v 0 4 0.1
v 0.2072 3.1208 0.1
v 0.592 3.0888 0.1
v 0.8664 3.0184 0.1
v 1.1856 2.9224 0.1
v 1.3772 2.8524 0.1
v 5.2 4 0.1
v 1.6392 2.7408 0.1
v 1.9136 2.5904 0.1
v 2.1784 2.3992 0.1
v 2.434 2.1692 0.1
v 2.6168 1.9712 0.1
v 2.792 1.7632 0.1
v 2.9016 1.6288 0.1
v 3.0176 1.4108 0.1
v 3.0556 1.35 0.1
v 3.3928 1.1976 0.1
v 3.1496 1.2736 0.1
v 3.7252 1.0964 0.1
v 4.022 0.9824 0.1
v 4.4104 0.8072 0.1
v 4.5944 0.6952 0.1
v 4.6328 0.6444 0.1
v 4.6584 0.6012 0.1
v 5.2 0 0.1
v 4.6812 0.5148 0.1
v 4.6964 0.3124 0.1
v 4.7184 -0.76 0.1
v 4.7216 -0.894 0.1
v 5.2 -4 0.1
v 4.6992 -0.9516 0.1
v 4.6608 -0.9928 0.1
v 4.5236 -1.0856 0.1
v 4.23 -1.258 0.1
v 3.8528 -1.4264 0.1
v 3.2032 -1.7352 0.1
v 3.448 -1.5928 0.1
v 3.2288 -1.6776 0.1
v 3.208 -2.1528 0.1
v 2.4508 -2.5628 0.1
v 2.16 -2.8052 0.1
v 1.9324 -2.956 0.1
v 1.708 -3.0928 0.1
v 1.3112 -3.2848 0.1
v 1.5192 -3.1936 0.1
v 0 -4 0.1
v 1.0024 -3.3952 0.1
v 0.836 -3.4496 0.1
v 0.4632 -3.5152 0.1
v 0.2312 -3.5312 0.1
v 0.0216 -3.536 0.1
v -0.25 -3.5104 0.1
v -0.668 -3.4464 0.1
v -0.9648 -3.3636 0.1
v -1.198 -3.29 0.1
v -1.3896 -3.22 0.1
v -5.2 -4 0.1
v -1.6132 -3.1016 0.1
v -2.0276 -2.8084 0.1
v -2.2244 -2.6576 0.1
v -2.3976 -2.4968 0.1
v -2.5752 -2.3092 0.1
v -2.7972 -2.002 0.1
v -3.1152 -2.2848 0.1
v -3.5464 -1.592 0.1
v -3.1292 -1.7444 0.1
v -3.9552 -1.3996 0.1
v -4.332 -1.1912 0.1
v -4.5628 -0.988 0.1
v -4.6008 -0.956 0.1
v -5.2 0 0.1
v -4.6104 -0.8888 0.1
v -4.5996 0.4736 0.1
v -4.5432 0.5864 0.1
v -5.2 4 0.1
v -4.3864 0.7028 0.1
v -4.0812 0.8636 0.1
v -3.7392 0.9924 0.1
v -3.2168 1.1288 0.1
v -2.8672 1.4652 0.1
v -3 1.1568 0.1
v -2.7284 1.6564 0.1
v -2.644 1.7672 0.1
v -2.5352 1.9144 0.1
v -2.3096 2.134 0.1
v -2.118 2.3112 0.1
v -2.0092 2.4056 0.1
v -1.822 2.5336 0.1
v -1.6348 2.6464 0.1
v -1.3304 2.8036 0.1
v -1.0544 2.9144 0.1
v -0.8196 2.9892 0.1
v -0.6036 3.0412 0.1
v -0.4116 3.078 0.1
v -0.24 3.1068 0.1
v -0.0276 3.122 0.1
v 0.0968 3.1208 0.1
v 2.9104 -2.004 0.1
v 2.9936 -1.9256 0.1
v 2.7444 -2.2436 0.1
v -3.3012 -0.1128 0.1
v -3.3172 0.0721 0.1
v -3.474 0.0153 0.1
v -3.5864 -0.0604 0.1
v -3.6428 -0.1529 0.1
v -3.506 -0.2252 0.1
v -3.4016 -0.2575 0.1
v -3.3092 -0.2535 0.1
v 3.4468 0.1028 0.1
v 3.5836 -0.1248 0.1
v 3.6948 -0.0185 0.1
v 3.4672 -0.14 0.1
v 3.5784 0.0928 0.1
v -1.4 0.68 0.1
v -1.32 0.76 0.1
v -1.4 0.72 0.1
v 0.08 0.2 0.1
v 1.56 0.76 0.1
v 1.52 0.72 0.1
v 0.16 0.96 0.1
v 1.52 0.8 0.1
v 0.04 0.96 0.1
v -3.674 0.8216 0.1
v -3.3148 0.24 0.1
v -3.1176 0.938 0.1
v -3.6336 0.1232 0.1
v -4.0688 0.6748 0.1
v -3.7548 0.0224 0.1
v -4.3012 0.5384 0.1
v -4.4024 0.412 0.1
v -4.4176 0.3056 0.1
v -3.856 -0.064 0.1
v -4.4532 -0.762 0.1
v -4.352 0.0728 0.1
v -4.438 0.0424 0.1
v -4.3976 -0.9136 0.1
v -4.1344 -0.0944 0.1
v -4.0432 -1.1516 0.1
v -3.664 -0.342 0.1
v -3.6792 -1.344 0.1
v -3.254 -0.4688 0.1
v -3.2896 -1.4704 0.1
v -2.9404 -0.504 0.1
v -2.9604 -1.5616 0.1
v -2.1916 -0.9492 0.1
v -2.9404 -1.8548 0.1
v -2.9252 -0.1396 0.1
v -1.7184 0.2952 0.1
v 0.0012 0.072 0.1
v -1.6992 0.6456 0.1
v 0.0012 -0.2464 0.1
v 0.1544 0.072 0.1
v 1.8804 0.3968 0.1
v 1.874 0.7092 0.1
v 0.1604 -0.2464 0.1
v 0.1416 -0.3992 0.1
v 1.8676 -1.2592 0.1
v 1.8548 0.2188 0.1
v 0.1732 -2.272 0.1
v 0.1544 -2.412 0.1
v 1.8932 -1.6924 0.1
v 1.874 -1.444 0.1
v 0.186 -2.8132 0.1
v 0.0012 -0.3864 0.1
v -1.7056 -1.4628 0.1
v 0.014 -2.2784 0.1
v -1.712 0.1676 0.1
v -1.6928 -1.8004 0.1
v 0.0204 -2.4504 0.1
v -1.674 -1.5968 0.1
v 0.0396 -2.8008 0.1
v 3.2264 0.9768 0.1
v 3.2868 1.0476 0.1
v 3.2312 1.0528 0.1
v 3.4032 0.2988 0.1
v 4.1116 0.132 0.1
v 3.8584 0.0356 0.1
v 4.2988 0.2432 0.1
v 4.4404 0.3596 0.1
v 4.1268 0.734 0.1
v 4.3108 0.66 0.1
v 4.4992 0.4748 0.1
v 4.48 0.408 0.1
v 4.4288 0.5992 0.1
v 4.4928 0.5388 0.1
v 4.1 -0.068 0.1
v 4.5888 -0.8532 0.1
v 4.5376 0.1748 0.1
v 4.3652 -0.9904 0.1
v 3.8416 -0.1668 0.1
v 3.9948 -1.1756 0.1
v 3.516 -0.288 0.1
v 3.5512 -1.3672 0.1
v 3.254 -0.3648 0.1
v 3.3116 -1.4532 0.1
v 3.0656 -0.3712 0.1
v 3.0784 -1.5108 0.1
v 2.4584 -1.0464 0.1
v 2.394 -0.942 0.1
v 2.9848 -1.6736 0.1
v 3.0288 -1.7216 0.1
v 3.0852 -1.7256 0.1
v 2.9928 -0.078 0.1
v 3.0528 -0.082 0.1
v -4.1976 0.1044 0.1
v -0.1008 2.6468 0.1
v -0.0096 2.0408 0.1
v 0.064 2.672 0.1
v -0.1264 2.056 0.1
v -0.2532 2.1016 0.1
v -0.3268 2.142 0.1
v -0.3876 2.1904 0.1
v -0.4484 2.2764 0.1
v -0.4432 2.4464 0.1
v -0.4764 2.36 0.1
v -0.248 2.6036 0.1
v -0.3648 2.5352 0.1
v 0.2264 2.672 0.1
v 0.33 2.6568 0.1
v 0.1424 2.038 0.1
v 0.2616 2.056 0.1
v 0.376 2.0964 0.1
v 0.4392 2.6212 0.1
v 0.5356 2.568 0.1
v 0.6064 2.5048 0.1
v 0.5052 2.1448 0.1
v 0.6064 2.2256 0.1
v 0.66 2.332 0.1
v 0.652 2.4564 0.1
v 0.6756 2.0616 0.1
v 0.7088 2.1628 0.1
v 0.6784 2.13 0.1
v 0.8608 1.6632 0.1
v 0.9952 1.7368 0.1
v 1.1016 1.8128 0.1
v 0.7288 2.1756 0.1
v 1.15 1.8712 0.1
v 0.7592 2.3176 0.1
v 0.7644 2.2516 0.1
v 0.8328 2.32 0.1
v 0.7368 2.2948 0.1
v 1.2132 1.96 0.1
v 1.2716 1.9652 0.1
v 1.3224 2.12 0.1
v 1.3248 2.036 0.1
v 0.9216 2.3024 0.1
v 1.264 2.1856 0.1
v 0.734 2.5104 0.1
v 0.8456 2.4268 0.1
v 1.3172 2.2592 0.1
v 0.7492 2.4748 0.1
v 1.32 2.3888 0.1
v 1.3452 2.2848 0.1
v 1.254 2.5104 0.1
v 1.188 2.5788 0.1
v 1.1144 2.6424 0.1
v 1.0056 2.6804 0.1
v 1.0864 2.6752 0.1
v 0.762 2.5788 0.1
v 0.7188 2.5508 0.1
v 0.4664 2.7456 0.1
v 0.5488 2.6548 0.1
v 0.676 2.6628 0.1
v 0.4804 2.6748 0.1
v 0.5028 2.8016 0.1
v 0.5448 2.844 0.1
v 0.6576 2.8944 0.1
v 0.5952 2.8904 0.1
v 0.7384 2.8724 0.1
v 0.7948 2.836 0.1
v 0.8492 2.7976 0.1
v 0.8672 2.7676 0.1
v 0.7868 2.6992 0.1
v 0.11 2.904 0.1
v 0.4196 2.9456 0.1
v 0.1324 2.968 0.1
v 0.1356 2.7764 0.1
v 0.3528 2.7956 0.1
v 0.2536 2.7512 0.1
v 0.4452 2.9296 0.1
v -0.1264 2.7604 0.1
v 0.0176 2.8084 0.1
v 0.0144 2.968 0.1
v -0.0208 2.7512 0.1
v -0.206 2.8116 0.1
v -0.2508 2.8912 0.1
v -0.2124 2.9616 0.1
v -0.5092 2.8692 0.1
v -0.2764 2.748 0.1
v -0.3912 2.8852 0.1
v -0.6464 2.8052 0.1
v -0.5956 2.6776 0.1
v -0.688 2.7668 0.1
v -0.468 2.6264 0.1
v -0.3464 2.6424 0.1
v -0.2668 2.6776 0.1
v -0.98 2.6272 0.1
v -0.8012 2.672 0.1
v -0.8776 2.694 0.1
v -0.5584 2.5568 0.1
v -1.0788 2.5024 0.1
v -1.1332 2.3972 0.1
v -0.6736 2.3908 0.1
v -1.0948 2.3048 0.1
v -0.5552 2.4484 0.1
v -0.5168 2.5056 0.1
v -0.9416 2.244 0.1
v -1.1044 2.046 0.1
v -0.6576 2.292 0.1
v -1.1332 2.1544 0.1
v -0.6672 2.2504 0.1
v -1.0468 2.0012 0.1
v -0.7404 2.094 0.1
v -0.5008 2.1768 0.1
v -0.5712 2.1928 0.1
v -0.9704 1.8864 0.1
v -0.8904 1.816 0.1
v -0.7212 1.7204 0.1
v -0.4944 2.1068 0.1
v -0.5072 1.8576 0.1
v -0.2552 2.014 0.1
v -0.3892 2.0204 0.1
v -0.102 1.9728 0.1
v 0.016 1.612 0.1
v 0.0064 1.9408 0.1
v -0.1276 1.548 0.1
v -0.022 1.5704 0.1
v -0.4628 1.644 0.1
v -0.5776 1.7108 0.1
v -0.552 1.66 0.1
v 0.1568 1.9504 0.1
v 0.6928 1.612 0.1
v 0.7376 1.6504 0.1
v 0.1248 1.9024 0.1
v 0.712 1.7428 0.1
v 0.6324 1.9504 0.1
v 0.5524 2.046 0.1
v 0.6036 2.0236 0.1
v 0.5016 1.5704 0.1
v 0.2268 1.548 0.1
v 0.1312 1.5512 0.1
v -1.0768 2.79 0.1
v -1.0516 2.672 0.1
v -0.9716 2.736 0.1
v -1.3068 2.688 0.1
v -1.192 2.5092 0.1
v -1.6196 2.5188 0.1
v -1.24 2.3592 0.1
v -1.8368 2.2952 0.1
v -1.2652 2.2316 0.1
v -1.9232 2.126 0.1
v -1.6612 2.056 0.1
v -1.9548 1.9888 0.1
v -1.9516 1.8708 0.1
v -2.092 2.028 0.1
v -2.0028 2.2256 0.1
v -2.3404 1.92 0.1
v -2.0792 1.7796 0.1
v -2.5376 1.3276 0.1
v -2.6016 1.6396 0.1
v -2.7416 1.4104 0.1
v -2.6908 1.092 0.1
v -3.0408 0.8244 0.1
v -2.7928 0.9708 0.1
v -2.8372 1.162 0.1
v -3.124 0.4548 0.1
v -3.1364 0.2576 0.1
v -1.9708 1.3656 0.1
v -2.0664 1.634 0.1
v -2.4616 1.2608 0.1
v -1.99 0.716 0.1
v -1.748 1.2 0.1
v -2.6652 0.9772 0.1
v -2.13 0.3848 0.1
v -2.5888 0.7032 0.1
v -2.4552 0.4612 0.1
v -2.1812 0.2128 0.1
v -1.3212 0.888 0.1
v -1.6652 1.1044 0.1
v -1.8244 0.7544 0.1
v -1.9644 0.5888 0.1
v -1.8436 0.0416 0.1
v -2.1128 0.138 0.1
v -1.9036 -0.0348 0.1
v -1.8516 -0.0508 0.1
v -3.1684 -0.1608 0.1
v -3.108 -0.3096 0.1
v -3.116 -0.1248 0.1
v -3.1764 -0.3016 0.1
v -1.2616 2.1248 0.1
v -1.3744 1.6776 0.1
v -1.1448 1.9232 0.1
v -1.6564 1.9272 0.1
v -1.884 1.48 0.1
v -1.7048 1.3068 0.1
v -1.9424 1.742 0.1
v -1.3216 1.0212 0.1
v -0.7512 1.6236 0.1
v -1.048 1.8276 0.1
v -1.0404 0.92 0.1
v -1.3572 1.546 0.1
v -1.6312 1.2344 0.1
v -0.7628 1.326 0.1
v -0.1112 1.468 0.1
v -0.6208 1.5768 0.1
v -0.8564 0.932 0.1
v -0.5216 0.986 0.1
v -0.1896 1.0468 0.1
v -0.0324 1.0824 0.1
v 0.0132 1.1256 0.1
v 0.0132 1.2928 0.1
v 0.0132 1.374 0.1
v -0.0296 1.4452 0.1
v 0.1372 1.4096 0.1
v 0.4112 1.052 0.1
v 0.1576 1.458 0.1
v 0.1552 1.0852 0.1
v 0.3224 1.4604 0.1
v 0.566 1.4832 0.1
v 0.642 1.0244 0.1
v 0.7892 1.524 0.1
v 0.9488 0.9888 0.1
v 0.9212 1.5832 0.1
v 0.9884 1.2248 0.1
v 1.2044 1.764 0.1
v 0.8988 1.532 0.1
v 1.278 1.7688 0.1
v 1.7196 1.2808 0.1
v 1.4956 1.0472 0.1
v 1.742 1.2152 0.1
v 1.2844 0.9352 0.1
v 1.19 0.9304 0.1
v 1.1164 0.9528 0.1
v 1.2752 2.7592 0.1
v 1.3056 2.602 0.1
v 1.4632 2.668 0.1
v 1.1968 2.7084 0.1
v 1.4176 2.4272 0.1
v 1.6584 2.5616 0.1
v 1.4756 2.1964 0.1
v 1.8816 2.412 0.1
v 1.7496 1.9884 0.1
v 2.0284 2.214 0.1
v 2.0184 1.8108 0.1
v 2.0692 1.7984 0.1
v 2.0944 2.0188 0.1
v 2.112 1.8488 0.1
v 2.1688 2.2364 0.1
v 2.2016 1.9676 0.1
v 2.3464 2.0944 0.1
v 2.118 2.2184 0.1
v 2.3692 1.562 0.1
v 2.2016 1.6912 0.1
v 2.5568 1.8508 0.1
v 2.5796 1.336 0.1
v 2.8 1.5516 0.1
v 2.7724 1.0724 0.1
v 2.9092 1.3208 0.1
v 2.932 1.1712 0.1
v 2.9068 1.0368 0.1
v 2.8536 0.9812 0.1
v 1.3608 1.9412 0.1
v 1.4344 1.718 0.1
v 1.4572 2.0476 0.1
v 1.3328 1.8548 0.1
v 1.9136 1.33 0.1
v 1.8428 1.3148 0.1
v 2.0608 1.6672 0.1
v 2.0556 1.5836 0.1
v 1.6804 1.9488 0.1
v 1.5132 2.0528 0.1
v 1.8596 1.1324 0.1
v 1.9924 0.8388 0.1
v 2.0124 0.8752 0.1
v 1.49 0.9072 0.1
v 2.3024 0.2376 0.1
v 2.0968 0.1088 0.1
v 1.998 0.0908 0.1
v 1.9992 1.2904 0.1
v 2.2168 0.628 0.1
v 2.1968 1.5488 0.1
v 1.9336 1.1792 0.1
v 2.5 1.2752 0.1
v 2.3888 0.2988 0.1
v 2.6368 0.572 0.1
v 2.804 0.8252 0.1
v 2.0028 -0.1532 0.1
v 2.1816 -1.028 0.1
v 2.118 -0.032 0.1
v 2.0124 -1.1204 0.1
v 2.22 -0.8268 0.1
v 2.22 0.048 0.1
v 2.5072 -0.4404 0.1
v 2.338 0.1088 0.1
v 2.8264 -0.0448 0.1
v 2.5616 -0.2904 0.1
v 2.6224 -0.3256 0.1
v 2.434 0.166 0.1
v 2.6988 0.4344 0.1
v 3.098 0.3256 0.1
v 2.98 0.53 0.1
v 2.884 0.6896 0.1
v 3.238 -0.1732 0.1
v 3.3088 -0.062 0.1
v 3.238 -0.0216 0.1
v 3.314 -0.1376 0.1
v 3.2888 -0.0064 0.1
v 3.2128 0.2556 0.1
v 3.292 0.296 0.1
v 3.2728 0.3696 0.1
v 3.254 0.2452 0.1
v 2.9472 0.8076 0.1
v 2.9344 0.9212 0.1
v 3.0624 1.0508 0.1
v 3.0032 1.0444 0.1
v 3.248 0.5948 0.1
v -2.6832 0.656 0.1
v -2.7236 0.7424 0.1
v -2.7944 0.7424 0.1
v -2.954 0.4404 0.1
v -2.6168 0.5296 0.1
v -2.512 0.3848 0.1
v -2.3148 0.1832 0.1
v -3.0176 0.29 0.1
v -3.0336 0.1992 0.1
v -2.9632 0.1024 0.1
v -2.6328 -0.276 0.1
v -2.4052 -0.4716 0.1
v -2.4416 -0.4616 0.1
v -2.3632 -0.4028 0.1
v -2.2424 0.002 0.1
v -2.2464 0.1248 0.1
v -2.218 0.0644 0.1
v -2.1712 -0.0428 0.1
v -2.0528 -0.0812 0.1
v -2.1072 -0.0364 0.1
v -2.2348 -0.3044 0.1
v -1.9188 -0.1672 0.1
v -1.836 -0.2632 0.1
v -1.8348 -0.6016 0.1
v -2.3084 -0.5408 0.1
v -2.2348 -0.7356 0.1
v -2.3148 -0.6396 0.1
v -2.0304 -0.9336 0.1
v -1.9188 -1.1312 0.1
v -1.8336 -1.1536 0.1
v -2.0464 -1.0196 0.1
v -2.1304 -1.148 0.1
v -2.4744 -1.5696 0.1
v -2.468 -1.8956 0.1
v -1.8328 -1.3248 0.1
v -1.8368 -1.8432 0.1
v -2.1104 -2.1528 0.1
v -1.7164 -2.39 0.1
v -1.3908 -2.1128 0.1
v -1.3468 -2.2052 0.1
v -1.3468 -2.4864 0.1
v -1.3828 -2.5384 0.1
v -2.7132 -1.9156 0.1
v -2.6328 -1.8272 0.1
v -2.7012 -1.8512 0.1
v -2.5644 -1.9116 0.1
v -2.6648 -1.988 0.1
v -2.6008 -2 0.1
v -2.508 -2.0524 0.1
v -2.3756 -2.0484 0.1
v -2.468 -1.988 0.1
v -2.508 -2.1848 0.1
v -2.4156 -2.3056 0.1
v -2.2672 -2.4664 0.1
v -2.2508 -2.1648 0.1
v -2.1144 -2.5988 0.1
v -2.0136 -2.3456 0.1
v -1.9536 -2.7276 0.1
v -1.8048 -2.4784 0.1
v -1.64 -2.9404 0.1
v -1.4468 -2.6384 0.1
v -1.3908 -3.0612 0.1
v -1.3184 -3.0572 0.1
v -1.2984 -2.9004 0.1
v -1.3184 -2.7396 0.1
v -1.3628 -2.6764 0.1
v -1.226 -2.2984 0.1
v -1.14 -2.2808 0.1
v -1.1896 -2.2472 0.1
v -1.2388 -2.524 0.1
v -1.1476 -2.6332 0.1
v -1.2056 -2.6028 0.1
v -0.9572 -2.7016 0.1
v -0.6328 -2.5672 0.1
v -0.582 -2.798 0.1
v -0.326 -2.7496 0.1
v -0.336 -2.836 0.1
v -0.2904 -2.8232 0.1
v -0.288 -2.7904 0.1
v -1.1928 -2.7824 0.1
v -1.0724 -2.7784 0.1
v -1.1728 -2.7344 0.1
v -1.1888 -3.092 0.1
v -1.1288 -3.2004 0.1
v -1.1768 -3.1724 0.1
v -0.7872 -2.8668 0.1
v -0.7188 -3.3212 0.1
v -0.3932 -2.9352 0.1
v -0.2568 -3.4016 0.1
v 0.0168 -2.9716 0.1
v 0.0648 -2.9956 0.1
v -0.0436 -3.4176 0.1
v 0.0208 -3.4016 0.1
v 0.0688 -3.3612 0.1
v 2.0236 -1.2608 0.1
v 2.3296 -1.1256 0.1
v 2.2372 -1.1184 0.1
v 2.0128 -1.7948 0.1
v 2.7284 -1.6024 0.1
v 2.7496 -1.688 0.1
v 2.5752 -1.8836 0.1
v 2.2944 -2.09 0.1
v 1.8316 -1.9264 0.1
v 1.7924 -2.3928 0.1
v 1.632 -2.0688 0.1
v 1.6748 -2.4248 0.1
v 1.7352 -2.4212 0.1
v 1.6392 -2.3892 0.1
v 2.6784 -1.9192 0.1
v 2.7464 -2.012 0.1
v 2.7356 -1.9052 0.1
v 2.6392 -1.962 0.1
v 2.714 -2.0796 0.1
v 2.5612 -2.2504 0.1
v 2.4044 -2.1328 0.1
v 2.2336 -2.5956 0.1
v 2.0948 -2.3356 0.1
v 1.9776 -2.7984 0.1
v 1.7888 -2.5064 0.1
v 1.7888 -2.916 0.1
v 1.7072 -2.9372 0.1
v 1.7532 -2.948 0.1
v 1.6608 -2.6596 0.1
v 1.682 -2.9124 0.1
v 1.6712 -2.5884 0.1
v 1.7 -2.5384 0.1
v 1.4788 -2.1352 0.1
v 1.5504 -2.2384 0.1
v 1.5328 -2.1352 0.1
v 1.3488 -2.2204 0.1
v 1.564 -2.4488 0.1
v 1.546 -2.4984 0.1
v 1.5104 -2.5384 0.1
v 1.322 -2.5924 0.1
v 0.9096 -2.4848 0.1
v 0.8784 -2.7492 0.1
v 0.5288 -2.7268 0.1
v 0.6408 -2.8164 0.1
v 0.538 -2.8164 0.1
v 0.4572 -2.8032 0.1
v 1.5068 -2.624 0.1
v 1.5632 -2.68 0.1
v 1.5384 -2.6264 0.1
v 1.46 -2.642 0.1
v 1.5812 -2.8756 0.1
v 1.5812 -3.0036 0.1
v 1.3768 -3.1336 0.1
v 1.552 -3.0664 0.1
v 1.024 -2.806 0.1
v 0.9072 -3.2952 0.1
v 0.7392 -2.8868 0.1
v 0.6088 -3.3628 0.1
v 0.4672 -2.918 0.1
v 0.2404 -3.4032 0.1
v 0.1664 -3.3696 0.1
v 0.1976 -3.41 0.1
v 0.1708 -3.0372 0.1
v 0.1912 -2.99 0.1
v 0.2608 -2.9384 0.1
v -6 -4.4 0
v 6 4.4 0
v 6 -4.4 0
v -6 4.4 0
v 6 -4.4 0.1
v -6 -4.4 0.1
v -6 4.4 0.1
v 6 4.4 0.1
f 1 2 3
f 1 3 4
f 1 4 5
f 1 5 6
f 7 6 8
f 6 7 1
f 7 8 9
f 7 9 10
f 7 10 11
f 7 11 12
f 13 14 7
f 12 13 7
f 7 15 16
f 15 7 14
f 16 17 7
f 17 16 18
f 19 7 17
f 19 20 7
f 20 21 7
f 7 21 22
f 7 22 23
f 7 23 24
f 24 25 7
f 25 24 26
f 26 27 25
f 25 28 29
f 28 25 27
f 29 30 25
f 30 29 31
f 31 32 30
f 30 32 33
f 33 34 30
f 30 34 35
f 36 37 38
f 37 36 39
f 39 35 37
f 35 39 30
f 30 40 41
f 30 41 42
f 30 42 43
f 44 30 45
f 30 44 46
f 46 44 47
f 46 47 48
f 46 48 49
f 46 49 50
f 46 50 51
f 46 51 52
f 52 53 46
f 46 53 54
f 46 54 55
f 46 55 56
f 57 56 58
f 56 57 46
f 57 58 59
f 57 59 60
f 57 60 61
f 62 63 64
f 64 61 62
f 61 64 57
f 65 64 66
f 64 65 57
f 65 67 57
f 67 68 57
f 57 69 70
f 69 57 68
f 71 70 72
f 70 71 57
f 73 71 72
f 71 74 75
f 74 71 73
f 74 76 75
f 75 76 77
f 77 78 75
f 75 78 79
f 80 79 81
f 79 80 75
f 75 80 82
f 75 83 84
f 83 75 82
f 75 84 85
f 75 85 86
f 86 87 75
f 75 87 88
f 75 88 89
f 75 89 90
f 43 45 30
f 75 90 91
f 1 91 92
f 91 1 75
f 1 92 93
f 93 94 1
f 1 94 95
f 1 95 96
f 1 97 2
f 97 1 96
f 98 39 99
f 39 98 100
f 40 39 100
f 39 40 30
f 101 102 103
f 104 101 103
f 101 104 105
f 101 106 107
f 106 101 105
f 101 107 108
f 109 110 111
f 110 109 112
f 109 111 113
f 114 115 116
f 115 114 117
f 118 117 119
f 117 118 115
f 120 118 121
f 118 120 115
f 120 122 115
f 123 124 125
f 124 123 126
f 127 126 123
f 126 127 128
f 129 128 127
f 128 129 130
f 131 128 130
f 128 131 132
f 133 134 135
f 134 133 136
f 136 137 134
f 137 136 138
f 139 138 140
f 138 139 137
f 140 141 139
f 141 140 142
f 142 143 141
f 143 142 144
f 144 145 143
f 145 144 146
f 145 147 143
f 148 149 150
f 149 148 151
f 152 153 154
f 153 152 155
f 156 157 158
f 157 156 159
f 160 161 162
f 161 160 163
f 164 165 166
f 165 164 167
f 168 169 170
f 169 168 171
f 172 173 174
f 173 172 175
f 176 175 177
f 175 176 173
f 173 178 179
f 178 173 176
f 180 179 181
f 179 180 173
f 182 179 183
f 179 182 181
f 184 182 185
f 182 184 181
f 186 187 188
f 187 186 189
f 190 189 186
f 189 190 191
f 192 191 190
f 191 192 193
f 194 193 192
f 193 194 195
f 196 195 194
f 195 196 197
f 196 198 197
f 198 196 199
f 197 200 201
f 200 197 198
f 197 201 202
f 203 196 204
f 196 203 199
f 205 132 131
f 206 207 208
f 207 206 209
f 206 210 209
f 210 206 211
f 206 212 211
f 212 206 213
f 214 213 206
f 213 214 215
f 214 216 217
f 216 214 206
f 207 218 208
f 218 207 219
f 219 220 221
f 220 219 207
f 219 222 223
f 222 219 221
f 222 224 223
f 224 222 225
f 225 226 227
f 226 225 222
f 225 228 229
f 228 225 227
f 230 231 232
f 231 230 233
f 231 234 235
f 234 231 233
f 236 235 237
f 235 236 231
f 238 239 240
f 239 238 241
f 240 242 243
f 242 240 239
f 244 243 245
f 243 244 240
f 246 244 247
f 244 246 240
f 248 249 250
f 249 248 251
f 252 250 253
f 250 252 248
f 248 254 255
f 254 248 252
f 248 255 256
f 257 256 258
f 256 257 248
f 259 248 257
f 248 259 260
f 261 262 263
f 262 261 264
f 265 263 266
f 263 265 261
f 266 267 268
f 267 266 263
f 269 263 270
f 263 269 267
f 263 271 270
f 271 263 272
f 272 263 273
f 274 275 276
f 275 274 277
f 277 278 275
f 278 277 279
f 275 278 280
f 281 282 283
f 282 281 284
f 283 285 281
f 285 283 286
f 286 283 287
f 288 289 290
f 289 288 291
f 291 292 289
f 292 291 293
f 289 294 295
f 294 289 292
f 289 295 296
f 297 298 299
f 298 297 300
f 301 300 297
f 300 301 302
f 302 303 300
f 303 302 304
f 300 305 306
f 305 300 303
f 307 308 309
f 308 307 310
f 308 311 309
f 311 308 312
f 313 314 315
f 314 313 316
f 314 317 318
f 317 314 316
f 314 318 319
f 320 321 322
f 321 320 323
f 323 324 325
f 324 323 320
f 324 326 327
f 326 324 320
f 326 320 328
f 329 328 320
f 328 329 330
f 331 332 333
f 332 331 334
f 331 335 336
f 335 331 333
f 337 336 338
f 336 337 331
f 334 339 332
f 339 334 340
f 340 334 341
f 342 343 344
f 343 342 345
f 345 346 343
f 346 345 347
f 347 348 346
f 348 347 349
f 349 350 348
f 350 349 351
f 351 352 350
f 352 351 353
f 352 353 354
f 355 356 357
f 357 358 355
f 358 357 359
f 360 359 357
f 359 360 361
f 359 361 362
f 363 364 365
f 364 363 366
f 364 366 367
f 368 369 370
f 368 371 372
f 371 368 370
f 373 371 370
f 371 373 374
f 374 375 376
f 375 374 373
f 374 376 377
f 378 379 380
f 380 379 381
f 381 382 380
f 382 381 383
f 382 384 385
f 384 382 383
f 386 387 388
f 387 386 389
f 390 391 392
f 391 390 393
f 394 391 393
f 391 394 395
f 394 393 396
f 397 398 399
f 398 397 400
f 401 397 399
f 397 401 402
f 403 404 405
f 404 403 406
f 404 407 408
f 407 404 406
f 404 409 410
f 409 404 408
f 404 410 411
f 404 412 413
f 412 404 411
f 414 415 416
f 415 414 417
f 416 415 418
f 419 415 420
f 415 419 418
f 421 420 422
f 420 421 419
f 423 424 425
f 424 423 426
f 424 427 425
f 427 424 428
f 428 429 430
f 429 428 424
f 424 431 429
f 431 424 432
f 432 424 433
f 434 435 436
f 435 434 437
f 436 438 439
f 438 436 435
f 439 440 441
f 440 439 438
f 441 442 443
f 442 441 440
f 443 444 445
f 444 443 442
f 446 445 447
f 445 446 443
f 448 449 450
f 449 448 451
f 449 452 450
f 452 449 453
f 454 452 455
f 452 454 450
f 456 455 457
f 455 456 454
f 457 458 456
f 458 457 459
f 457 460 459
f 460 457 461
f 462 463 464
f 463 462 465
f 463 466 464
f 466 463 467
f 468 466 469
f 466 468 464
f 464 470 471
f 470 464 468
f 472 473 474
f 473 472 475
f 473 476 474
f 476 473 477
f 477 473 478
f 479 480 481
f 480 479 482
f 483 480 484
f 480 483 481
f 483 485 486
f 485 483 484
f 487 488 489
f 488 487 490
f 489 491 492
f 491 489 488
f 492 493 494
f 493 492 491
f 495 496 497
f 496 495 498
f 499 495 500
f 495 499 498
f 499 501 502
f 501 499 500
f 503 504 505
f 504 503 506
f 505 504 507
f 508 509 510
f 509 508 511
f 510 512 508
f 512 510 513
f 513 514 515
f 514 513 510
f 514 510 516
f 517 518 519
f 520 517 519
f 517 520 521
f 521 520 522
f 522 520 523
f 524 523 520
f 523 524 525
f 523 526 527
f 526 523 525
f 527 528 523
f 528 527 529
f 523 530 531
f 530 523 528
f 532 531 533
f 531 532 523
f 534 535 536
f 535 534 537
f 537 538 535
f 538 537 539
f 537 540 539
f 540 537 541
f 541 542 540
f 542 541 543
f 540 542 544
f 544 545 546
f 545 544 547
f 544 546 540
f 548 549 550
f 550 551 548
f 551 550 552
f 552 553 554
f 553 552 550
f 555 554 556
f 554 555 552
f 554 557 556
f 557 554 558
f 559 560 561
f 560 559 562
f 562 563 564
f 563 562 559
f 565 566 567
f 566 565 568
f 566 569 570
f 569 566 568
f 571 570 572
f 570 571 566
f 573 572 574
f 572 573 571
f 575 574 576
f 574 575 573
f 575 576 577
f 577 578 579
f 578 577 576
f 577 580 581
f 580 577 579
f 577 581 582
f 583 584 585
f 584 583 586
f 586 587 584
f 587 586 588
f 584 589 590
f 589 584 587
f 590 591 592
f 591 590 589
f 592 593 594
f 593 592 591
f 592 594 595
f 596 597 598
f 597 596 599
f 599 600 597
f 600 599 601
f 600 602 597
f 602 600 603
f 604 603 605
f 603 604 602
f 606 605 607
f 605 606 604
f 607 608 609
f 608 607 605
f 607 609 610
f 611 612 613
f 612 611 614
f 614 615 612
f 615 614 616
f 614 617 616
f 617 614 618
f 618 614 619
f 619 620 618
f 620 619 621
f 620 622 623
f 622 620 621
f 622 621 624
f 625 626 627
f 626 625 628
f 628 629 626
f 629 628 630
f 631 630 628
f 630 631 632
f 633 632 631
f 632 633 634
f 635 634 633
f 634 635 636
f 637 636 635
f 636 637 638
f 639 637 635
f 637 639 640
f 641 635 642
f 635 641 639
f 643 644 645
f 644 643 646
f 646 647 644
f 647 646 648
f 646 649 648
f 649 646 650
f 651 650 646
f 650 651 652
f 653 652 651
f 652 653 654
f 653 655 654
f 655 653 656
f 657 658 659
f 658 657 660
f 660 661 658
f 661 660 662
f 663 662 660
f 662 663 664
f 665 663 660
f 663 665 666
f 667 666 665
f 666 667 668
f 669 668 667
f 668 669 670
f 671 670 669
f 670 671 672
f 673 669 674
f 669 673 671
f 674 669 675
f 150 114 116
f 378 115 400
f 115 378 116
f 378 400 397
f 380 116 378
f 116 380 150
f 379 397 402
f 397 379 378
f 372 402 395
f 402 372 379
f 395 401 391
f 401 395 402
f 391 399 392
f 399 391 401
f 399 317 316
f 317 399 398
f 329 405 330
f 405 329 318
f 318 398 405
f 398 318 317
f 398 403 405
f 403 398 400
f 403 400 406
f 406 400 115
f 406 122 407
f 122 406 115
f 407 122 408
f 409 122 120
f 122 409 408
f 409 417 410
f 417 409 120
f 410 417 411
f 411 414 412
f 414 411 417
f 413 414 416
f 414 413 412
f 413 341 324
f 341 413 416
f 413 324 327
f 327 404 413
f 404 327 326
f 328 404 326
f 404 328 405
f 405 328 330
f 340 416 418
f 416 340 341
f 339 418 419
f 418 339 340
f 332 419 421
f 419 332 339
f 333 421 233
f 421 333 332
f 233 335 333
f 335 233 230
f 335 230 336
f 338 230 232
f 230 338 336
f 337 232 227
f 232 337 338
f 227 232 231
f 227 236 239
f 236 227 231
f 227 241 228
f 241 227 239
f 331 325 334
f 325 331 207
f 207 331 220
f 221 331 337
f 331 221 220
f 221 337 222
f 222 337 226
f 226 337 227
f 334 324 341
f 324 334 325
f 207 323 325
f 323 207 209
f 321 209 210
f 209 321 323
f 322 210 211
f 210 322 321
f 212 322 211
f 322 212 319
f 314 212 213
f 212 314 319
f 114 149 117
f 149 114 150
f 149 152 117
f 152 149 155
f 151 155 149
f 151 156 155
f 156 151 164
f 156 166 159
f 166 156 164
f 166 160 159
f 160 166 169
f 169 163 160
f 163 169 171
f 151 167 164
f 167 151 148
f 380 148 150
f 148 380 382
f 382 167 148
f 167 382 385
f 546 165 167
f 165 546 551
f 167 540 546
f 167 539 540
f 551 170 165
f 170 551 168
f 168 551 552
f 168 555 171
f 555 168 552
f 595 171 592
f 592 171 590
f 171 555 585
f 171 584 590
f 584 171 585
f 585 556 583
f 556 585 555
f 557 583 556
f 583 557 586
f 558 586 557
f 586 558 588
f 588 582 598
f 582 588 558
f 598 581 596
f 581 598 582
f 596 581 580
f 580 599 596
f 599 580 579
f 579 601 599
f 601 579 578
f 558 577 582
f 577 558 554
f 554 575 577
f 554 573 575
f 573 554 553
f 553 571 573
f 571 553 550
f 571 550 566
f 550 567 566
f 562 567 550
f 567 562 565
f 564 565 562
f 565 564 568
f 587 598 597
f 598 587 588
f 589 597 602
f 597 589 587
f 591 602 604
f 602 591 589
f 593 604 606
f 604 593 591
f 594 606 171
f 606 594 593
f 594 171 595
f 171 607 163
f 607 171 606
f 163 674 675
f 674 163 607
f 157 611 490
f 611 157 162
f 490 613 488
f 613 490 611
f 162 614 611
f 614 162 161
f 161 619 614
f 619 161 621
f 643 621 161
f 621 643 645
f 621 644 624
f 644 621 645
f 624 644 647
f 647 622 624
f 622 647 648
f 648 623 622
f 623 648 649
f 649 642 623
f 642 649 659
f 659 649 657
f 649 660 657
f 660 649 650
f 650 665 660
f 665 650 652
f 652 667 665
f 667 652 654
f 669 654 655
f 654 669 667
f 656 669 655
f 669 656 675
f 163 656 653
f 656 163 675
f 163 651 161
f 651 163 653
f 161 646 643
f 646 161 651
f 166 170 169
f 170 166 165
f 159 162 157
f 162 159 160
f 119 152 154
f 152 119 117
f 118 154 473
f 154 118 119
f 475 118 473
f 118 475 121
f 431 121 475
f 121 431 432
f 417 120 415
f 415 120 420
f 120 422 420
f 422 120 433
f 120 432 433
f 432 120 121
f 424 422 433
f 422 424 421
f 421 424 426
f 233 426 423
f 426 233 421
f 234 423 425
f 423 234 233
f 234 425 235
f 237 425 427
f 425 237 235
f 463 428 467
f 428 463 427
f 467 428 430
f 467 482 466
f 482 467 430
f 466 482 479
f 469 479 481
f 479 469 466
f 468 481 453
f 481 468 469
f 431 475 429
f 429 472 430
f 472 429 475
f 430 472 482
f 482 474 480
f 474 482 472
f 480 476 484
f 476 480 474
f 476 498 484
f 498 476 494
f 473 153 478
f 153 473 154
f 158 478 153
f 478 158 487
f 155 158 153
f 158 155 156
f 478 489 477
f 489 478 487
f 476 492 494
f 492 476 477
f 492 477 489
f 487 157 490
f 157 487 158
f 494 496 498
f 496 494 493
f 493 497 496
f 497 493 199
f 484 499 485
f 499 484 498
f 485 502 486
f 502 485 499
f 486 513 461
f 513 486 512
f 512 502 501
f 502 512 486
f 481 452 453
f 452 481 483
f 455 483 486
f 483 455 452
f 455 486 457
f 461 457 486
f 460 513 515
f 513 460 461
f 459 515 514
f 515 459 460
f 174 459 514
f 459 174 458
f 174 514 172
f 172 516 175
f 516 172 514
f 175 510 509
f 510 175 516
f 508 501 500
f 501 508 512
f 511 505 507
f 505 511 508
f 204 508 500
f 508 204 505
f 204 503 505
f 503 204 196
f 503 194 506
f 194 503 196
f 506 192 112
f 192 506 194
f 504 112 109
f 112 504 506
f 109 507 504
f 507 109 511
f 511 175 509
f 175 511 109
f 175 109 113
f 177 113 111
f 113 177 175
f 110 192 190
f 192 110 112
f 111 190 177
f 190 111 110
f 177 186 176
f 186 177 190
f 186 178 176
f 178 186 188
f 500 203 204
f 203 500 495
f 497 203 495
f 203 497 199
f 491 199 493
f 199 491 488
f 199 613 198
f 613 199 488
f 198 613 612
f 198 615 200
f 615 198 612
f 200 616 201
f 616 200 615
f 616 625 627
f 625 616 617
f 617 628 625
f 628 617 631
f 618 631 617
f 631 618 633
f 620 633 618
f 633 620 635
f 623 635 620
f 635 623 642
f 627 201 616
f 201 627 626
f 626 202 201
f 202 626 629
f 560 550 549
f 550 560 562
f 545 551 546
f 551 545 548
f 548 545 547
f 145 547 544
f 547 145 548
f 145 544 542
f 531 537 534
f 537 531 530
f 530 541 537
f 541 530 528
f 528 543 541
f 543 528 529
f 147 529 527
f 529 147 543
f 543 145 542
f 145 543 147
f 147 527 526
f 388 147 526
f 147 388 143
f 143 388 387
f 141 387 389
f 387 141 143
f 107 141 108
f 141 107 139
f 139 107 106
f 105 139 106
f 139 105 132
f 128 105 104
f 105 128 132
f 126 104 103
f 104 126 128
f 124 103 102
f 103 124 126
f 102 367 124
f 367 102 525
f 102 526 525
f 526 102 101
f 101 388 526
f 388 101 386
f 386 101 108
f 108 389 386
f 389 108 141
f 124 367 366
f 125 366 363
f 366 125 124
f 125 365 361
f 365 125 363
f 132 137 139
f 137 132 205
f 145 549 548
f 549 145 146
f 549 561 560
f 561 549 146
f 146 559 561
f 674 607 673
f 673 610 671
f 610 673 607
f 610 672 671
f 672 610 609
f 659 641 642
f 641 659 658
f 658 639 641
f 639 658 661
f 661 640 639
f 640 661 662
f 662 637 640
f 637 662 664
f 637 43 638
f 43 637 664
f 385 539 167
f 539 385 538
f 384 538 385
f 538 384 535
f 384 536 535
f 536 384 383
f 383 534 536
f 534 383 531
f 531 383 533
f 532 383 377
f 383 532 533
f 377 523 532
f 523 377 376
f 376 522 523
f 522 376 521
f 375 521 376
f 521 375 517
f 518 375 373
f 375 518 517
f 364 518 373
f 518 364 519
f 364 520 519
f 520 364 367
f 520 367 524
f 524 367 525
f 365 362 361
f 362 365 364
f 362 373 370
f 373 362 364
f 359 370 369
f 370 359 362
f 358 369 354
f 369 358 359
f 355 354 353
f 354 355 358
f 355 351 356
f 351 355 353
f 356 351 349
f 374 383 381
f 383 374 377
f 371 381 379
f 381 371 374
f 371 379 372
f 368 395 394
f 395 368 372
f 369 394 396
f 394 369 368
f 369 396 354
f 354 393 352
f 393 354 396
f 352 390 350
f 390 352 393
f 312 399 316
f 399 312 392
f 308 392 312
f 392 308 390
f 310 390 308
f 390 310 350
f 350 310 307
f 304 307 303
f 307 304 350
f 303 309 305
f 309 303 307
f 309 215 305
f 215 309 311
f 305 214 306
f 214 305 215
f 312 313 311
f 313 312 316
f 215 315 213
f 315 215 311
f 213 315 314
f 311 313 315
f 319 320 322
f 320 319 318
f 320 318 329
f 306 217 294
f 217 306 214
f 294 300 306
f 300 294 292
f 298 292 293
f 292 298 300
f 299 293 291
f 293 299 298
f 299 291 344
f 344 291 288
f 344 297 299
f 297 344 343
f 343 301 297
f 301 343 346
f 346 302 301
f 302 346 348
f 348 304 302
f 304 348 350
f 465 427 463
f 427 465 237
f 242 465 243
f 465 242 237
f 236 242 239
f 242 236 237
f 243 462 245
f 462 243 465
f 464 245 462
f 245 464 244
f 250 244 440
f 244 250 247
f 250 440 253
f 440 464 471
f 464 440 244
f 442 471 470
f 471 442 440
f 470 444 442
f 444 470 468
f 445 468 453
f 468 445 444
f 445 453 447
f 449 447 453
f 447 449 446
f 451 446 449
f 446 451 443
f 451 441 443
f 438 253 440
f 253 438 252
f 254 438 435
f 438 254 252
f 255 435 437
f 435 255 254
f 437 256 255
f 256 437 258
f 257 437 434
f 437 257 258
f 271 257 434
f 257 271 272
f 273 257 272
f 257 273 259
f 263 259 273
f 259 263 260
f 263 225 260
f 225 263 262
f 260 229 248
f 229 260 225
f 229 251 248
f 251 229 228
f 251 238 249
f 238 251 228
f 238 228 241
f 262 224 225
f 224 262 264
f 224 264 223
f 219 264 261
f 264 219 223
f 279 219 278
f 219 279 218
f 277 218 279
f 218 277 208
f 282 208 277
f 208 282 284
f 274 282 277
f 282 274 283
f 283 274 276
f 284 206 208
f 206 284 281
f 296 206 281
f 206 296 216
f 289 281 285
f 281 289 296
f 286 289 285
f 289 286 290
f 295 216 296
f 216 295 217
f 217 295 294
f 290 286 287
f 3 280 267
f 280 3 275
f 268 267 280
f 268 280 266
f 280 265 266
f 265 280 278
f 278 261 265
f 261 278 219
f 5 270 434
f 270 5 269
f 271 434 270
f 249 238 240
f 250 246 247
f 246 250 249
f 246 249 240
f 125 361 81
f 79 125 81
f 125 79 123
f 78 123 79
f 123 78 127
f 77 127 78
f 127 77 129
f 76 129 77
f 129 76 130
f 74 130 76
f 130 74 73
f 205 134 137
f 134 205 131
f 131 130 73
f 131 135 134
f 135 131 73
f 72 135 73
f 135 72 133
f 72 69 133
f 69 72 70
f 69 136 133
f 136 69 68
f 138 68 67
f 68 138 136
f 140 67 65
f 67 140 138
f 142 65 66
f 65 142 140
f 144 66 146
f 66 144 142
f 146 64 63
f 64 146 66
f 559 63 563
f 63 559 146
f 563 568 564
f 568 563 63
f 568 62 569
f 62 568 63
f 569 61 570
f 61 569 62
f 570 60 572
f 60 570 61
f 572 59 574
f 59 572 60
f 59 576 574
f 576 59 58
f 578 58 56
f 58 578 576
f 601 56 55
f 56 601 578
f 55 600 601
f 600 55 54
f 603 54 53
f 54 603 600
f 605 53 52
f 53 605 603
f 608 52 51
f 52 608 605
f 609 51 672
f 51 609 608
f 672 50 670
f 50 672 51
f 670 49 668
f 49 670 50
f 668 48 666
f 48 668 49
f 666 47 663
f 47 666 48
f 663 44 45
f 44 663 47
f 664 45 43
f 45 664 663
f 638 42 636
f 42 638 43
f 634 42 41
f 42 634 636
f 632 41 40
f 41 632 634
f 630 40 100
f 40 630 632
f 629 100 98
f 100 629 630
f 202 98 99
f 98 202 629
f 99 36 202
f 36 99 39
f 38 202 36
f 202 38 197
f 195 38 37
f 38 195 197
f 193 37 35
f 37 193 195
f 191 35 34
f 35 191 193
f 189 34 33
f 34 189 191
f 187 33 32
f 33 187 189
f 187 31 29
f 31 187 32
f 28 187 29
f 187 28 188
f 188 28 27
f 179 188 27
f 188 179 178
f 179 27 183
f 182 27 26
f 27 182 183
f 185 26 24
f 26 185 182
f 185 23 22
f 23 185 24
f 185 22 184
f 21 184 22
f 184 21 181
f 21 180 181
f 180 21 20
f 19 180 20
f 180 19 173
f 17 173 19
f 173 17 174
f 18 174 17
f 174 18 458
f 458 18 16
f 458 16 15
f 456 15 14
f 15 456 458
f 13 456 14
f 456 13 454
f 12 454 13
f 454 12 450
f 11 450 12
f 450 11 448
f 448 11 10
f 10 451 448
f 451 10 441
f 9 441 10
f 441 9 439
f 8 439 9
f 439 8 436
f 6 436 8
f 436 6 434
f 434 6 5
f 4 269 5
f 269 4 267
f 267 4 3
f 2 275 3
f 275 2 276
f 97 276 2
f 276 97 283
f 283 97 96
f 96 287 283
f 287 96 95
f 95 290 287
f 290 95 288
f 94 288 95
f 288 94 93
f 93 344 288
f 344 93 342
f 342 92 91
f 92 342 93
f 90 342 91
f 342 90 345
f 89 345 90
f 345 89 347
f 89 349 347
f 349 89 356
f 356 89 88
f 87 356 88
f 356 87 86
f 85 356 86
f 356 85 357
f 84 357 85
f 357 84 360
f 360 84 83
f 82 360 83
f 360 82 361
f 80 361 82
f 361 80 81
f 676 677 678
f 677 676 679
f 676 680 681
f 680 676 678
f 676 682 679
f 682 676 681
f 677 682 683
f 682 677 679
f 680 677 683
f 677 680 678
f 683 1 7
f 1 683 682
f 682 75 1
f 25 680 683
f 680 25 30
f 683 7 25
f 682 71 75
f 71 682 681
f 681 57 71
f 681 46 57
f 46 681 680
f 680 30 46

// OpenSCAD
use <../lib.scad>
use <169675a.scad>
function ldraw_lib__820673b() = [
// 0 =Sticker  1.1 x  1.5 with Blue Globe, Yellow Box and Curved Arrows
// 0 Name: 820673b.dat
// 0 Author: Takeshi Takahashi [RainbowDolphin]
// 0 !LDRAW_ORG Part Alias UPDATE 2024-07
// 0 !LICENSE Licensed under CC BY 4.0 : see CAreadme.txt
// 
// 0 BFC CERTIFY CCW
  [0,"BFC","CERTIFY"],
  [0,"BFC","CCW"],
// 
// 0 !KEYWORDS Bricklink 6542stk01, Brickowl 602283, Container Ship, Forklift
// 0 !KEYWORDS Launch and load seaport, Rebrickable 820673, Set 6542
// 
// 0 !HISTORY 2024-08-26 [OrionP] Official Update 2024-07
// 
// 1 16 0 0 0 1 0 0 0 1 0 0 0 1 169675a.dat
  [1,16,0,0,0,1,0,0,0,1,0,0,0,1, ldraw_lib__169675a()],
];
module ldraw_lib__820673b(step=0, col=false, unit=2/5, alt=false, line=0.2, solid=!$preview)
    makepoly(ldraw_lib__820673b(), step=step, col=col, unit=unit, alt=alt, line=line, solid=solid);
ldraw_lib__820673b(line=0.2);
